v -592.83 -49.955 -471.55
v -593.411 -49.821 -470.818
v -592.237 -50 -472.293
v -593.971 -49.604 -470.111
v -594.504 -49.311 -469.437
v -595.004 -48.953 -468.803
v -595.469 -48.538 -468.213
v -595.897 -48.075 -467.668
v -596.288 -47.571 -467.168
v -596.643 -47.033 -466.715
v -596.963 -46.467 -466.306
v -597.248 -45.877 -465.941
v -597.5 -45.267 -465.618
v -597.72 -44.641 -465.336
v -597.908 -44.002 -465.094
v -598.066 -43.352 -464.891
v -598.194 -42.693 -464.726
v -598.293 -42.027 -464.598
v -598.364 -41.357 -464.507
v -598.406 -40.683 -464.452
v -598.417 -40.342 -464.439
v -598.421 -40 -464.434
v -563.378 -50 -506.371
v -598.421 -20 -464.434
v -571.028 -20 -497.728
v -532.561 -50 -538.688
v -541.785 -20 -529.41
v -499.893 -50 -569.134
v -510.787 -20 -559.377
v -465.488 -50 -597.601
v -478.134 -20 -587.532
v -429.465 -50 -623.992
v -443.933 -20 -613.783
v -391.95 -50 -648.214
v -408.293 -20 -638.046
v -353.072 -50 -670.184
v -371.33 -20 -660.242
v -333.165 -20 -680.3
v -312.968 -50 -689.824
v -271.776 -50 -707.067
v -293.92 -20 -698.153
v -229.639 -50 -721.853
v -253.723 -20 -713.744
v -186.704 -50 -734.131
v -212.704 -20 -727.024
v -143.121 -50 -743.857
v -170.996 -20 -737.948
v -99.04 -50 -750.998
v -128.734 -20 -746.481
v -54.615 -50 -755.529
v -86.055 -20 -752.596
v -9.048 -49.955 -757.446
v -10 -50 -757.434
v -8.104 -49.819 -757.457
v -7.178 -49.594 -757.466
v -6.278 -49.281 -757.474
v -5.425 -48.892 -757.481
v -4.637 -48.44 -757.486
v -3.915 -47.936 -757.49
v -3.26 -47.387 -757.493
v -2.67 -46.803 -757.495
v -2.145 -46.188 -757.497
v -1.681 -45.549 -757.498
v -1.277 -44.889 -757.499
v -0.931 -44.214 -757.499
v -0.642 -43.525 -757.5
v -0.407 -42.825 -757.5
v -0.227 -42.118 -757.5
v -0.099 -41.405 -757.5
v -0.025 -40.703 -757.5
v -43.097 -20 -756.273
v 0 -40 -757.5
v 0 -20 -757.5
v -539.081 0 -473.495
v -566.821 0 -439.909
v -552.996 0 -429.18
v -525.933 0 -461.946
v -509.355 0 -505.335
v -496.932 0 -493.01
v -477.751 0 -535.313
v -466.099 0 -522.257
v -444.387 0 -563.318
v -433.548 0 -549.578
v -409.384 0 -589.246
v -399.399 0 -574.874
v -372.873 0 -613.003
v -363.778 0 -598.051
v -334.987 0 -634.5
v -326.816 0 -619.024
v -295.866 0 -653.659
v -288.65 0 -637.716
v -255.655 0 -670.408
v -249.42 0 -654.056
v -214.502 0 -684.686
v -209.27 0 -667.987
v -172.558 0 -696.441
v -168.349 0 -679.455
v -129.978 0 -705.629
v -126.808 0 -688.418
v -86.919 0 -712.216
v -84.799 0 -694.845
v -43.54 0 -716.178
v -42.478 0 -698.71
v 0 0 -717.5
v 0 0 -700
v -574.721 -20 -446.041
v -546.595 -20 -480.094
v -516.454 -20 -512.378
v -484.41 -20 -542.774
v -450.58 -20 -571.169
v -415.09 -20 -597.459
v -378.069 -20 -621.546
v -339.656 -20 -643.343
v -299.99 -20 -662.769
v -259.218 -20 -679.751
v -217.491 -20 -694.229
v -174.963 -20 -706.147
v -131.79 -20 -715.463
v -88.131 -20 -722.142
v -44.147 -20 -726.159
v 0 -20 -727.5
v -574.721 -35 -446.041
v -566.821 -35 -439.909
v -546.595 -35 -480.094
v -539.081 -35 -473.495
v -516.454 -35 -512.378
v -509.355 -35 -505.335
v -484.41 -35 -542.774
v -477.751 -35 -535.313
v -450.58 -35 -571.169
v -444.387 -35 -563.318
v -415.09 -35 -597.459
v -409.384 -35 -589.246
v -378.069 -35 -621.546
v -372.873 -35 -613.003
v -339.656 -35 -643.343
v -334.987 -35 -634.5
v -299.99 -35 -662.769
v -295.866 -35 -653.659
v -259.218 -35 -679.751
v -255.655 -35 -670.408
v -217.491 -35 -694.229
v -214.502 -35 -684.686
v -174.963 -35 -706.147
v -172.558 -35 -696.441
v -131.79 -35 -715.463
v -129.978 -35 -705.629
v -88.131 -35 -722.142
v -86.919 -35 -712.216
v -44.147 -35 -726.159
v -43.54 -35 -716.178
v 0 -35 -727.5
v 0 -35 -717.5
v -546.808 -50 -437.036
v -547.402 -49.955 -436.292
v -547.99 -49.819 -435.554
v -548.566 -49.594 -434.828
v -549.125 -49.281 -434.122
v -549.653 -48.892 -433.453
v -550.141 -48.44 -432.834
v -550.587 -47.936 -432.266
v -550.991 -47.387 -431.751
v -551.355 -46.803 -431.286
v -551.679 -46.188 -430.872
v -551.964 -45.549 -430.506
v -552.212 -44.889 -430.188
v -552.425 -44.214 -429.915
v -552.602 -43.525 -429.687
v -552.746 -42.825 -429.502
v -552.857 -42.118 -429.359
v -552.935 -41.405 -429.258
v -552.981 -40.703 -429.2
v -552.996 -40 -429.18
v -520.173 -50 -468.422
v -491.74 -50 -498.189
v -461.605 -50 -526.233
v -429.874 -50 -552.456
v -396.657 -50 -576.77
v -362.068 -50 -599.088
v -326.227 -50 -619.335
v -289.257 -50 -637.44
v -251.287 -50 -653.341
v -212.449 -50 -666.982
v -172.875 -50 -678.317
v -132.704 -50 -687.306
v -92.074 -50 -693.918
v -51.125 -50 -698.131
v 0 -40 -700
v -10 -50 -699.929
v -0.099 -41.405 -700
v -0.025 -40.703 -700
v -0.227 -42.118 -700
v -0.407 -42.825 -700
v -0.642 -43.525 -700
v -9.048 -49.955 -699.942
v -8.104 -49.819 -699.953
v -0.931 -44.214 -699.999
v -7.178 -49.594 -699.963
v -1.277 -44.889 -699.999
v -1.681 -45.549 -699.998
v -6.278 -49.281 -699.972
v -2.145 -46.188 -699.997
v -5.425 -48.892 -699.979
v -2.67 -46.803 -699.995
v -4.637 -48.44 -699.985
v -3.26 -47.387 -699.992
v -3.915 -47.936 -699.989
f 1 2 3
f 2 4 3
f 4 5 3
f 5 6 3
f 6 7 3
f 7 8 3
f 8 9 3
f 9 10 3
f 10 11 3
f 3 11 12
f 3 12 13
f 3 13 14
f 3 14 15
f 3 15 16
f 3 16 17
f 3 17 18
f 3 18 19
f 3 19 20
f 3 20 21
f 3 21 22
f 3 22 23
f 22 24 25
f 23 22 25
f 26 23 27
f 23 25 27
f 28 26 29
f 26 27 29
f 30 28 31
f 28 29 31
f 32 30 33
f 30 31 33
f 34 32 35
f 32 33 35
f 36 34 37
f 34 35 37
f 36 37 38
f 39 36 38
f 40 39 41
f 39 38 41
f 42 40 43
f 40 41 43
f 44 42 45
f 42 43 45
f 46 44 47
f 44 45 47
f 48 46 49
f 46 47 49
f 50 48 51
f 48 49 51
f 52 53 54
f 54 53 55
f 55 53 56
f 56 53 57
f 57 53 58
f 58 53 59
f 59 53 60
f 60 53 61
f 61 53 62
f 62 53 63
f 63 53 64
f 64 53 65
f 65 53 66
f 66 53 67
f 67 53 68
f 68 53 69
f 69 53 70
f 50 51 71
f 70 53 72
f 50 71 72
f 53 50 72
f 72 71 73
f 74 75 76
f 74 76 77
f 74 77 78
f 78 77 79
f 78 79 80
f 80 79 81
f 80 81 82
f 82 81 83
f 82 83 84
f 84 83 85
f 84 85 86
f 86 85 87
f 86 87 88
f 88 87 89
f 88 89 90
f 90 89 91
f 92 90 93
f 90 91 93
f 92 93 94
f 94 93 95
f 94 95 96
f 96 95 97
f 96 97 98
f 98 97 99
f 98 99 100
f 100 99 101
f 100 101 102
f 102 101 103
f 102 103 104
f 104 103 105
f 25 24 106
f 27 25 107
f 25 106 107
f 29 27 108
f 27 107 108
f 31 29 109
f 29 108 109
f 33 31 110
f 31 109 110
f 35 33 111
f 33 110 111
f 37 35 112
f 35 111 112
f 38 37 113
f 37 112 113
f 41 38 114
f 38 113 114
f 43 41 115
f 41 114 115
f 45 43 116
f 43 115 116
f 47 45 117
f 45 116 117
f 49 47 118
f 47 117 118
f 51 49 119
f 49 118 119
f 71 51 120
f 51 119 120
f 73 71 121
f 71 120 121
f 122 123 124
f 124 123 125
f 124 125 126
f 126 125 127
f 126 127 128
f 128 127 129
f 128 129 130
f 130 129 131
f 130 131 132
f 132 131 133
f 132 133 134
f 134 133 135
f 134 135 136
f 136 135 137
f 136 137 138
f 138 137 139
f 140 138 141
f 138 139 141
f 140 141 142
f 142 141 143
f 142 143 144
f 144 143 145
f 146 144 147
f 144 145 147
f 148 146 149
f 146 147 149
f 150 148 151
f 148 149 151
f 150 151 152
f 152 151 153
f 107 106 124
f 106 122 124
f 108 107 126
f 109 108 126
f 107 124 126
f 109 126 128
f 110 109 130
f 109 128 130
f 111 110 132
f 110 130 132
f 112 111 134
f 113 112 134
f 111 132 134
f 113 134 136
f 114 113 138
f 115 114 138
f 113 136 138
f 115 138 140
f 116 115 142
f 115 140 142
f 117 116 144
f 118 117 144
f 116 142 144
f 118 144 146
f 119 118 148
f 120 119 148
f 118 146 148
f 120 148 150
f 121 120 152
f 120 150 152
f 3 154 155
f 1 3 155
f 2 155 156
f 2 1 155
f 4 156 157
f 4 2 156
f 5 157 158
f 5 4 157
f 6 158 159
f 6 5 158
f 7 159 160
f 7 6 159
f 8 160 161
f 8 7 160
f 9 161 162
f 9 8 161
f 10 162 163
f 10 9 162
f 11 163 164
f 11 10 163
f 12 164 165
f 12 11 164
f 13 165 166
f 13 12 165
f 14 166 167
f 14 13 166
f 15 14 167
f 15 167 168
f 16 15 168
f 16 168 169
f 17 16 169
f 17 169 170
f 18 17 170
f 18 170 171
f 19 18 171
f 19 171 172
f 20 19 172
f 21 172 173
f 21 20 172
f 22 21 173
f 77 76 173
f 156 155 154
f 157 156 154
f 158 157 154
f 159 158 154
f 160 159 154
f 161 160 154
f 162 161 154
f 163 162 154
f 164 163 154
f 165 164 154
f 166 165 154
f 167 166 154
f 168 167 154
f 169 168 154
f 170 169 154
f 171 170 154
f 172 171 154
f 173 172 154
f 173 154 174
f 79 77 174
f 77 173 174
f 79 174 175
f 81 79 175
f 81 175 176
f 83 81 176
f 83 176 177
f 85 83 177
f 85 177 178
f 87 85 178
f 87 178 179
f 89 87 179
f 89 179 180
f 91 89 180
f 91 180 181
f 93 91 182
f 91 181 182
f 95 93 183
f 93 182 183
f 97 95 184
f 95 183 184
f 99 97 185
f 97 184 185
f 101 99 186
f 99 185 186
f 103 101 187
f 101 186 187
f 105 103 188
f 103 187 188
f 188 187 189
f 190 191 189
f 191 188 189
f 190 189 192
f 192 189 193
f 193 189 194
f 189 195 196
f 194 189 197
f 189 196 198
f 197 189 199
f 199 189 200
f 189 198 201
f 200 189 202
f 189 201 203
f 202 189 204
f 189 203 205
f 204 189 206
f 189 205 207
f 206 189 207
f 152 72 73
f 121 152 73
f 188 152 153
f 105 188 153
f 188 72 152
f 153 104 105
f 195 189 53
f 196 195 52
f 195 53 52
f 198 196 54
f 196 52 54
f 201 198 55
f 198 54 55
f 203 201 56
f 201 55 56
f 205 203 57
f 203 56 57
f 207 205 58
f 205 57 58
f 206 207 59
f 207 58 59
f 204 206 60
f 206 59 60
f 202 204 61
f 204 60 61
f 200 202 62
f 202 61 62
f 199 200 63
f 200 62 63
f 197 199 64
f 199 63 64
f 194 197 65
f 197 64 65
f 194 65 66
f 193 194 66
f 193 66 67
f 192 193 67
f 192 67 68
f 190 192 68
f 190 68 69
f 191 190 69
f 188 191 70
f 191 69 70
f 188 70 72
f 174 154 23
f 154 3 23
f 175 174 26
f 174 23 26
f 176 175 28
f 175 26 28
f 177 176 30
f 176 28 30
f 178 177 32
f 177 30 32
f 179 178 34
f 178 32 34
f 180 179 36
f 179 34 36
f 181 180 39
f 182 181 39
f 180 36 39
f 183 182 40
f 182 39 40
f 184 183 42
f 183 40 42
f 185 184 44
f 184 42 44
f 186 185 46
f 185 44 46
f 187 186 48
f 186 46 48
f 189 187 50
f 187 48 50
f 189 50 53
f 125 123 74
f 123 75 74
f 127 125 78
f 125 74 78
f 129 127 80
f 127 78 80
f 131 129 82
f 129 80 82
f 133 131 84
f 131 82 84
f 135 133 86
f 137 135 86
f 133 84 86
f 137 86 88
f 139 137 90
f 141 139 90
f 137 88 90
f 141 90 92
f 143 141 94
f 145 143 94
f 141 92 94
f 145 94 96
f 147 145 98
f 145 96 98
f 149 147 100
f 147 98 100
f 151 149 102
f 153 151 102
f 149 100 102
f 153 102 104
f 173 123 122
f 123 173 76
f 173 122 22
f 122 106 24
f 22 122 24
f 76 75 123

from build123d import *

# Parameters (mm, degrees)
F3_R = 10
F4_R = 10


with BuildPart() as f2:
    # F2: sweep along a path in F0
    with BuildLine(Plane.XZ) as f2_path:
        ThreePointArc((-552.9959908712, -429.1799553571), (-307.875, -628.6596729352), (0, -700))
    # F1 (on Right) → F2 (sweep)
    with BuildSketch(Plane.YZ):
        Polygon((0, -717.5), (0, -700), (-50, -700), (-50, -757.5), (-20, -757.5), (-20, -727.5), (-35, -727.5), (-35, -717.5), align=None)
    sweep(path=f2_path.line)

    # F3
    f3_edges = [f2.edges().sort_by_distance(p)[0] for p in [
        (-575.708326, -50, -446.806989),
    ]]
    fillet(f3_edges, radius=F3_R)

    # F4
    f4_edges = [f2.edges().sort_by_distance(p)[0] for p in [
        (0, -50, -728.75),
    ]]
    fillet(f4_edges, radius=F4_R)


solid = f2.part
